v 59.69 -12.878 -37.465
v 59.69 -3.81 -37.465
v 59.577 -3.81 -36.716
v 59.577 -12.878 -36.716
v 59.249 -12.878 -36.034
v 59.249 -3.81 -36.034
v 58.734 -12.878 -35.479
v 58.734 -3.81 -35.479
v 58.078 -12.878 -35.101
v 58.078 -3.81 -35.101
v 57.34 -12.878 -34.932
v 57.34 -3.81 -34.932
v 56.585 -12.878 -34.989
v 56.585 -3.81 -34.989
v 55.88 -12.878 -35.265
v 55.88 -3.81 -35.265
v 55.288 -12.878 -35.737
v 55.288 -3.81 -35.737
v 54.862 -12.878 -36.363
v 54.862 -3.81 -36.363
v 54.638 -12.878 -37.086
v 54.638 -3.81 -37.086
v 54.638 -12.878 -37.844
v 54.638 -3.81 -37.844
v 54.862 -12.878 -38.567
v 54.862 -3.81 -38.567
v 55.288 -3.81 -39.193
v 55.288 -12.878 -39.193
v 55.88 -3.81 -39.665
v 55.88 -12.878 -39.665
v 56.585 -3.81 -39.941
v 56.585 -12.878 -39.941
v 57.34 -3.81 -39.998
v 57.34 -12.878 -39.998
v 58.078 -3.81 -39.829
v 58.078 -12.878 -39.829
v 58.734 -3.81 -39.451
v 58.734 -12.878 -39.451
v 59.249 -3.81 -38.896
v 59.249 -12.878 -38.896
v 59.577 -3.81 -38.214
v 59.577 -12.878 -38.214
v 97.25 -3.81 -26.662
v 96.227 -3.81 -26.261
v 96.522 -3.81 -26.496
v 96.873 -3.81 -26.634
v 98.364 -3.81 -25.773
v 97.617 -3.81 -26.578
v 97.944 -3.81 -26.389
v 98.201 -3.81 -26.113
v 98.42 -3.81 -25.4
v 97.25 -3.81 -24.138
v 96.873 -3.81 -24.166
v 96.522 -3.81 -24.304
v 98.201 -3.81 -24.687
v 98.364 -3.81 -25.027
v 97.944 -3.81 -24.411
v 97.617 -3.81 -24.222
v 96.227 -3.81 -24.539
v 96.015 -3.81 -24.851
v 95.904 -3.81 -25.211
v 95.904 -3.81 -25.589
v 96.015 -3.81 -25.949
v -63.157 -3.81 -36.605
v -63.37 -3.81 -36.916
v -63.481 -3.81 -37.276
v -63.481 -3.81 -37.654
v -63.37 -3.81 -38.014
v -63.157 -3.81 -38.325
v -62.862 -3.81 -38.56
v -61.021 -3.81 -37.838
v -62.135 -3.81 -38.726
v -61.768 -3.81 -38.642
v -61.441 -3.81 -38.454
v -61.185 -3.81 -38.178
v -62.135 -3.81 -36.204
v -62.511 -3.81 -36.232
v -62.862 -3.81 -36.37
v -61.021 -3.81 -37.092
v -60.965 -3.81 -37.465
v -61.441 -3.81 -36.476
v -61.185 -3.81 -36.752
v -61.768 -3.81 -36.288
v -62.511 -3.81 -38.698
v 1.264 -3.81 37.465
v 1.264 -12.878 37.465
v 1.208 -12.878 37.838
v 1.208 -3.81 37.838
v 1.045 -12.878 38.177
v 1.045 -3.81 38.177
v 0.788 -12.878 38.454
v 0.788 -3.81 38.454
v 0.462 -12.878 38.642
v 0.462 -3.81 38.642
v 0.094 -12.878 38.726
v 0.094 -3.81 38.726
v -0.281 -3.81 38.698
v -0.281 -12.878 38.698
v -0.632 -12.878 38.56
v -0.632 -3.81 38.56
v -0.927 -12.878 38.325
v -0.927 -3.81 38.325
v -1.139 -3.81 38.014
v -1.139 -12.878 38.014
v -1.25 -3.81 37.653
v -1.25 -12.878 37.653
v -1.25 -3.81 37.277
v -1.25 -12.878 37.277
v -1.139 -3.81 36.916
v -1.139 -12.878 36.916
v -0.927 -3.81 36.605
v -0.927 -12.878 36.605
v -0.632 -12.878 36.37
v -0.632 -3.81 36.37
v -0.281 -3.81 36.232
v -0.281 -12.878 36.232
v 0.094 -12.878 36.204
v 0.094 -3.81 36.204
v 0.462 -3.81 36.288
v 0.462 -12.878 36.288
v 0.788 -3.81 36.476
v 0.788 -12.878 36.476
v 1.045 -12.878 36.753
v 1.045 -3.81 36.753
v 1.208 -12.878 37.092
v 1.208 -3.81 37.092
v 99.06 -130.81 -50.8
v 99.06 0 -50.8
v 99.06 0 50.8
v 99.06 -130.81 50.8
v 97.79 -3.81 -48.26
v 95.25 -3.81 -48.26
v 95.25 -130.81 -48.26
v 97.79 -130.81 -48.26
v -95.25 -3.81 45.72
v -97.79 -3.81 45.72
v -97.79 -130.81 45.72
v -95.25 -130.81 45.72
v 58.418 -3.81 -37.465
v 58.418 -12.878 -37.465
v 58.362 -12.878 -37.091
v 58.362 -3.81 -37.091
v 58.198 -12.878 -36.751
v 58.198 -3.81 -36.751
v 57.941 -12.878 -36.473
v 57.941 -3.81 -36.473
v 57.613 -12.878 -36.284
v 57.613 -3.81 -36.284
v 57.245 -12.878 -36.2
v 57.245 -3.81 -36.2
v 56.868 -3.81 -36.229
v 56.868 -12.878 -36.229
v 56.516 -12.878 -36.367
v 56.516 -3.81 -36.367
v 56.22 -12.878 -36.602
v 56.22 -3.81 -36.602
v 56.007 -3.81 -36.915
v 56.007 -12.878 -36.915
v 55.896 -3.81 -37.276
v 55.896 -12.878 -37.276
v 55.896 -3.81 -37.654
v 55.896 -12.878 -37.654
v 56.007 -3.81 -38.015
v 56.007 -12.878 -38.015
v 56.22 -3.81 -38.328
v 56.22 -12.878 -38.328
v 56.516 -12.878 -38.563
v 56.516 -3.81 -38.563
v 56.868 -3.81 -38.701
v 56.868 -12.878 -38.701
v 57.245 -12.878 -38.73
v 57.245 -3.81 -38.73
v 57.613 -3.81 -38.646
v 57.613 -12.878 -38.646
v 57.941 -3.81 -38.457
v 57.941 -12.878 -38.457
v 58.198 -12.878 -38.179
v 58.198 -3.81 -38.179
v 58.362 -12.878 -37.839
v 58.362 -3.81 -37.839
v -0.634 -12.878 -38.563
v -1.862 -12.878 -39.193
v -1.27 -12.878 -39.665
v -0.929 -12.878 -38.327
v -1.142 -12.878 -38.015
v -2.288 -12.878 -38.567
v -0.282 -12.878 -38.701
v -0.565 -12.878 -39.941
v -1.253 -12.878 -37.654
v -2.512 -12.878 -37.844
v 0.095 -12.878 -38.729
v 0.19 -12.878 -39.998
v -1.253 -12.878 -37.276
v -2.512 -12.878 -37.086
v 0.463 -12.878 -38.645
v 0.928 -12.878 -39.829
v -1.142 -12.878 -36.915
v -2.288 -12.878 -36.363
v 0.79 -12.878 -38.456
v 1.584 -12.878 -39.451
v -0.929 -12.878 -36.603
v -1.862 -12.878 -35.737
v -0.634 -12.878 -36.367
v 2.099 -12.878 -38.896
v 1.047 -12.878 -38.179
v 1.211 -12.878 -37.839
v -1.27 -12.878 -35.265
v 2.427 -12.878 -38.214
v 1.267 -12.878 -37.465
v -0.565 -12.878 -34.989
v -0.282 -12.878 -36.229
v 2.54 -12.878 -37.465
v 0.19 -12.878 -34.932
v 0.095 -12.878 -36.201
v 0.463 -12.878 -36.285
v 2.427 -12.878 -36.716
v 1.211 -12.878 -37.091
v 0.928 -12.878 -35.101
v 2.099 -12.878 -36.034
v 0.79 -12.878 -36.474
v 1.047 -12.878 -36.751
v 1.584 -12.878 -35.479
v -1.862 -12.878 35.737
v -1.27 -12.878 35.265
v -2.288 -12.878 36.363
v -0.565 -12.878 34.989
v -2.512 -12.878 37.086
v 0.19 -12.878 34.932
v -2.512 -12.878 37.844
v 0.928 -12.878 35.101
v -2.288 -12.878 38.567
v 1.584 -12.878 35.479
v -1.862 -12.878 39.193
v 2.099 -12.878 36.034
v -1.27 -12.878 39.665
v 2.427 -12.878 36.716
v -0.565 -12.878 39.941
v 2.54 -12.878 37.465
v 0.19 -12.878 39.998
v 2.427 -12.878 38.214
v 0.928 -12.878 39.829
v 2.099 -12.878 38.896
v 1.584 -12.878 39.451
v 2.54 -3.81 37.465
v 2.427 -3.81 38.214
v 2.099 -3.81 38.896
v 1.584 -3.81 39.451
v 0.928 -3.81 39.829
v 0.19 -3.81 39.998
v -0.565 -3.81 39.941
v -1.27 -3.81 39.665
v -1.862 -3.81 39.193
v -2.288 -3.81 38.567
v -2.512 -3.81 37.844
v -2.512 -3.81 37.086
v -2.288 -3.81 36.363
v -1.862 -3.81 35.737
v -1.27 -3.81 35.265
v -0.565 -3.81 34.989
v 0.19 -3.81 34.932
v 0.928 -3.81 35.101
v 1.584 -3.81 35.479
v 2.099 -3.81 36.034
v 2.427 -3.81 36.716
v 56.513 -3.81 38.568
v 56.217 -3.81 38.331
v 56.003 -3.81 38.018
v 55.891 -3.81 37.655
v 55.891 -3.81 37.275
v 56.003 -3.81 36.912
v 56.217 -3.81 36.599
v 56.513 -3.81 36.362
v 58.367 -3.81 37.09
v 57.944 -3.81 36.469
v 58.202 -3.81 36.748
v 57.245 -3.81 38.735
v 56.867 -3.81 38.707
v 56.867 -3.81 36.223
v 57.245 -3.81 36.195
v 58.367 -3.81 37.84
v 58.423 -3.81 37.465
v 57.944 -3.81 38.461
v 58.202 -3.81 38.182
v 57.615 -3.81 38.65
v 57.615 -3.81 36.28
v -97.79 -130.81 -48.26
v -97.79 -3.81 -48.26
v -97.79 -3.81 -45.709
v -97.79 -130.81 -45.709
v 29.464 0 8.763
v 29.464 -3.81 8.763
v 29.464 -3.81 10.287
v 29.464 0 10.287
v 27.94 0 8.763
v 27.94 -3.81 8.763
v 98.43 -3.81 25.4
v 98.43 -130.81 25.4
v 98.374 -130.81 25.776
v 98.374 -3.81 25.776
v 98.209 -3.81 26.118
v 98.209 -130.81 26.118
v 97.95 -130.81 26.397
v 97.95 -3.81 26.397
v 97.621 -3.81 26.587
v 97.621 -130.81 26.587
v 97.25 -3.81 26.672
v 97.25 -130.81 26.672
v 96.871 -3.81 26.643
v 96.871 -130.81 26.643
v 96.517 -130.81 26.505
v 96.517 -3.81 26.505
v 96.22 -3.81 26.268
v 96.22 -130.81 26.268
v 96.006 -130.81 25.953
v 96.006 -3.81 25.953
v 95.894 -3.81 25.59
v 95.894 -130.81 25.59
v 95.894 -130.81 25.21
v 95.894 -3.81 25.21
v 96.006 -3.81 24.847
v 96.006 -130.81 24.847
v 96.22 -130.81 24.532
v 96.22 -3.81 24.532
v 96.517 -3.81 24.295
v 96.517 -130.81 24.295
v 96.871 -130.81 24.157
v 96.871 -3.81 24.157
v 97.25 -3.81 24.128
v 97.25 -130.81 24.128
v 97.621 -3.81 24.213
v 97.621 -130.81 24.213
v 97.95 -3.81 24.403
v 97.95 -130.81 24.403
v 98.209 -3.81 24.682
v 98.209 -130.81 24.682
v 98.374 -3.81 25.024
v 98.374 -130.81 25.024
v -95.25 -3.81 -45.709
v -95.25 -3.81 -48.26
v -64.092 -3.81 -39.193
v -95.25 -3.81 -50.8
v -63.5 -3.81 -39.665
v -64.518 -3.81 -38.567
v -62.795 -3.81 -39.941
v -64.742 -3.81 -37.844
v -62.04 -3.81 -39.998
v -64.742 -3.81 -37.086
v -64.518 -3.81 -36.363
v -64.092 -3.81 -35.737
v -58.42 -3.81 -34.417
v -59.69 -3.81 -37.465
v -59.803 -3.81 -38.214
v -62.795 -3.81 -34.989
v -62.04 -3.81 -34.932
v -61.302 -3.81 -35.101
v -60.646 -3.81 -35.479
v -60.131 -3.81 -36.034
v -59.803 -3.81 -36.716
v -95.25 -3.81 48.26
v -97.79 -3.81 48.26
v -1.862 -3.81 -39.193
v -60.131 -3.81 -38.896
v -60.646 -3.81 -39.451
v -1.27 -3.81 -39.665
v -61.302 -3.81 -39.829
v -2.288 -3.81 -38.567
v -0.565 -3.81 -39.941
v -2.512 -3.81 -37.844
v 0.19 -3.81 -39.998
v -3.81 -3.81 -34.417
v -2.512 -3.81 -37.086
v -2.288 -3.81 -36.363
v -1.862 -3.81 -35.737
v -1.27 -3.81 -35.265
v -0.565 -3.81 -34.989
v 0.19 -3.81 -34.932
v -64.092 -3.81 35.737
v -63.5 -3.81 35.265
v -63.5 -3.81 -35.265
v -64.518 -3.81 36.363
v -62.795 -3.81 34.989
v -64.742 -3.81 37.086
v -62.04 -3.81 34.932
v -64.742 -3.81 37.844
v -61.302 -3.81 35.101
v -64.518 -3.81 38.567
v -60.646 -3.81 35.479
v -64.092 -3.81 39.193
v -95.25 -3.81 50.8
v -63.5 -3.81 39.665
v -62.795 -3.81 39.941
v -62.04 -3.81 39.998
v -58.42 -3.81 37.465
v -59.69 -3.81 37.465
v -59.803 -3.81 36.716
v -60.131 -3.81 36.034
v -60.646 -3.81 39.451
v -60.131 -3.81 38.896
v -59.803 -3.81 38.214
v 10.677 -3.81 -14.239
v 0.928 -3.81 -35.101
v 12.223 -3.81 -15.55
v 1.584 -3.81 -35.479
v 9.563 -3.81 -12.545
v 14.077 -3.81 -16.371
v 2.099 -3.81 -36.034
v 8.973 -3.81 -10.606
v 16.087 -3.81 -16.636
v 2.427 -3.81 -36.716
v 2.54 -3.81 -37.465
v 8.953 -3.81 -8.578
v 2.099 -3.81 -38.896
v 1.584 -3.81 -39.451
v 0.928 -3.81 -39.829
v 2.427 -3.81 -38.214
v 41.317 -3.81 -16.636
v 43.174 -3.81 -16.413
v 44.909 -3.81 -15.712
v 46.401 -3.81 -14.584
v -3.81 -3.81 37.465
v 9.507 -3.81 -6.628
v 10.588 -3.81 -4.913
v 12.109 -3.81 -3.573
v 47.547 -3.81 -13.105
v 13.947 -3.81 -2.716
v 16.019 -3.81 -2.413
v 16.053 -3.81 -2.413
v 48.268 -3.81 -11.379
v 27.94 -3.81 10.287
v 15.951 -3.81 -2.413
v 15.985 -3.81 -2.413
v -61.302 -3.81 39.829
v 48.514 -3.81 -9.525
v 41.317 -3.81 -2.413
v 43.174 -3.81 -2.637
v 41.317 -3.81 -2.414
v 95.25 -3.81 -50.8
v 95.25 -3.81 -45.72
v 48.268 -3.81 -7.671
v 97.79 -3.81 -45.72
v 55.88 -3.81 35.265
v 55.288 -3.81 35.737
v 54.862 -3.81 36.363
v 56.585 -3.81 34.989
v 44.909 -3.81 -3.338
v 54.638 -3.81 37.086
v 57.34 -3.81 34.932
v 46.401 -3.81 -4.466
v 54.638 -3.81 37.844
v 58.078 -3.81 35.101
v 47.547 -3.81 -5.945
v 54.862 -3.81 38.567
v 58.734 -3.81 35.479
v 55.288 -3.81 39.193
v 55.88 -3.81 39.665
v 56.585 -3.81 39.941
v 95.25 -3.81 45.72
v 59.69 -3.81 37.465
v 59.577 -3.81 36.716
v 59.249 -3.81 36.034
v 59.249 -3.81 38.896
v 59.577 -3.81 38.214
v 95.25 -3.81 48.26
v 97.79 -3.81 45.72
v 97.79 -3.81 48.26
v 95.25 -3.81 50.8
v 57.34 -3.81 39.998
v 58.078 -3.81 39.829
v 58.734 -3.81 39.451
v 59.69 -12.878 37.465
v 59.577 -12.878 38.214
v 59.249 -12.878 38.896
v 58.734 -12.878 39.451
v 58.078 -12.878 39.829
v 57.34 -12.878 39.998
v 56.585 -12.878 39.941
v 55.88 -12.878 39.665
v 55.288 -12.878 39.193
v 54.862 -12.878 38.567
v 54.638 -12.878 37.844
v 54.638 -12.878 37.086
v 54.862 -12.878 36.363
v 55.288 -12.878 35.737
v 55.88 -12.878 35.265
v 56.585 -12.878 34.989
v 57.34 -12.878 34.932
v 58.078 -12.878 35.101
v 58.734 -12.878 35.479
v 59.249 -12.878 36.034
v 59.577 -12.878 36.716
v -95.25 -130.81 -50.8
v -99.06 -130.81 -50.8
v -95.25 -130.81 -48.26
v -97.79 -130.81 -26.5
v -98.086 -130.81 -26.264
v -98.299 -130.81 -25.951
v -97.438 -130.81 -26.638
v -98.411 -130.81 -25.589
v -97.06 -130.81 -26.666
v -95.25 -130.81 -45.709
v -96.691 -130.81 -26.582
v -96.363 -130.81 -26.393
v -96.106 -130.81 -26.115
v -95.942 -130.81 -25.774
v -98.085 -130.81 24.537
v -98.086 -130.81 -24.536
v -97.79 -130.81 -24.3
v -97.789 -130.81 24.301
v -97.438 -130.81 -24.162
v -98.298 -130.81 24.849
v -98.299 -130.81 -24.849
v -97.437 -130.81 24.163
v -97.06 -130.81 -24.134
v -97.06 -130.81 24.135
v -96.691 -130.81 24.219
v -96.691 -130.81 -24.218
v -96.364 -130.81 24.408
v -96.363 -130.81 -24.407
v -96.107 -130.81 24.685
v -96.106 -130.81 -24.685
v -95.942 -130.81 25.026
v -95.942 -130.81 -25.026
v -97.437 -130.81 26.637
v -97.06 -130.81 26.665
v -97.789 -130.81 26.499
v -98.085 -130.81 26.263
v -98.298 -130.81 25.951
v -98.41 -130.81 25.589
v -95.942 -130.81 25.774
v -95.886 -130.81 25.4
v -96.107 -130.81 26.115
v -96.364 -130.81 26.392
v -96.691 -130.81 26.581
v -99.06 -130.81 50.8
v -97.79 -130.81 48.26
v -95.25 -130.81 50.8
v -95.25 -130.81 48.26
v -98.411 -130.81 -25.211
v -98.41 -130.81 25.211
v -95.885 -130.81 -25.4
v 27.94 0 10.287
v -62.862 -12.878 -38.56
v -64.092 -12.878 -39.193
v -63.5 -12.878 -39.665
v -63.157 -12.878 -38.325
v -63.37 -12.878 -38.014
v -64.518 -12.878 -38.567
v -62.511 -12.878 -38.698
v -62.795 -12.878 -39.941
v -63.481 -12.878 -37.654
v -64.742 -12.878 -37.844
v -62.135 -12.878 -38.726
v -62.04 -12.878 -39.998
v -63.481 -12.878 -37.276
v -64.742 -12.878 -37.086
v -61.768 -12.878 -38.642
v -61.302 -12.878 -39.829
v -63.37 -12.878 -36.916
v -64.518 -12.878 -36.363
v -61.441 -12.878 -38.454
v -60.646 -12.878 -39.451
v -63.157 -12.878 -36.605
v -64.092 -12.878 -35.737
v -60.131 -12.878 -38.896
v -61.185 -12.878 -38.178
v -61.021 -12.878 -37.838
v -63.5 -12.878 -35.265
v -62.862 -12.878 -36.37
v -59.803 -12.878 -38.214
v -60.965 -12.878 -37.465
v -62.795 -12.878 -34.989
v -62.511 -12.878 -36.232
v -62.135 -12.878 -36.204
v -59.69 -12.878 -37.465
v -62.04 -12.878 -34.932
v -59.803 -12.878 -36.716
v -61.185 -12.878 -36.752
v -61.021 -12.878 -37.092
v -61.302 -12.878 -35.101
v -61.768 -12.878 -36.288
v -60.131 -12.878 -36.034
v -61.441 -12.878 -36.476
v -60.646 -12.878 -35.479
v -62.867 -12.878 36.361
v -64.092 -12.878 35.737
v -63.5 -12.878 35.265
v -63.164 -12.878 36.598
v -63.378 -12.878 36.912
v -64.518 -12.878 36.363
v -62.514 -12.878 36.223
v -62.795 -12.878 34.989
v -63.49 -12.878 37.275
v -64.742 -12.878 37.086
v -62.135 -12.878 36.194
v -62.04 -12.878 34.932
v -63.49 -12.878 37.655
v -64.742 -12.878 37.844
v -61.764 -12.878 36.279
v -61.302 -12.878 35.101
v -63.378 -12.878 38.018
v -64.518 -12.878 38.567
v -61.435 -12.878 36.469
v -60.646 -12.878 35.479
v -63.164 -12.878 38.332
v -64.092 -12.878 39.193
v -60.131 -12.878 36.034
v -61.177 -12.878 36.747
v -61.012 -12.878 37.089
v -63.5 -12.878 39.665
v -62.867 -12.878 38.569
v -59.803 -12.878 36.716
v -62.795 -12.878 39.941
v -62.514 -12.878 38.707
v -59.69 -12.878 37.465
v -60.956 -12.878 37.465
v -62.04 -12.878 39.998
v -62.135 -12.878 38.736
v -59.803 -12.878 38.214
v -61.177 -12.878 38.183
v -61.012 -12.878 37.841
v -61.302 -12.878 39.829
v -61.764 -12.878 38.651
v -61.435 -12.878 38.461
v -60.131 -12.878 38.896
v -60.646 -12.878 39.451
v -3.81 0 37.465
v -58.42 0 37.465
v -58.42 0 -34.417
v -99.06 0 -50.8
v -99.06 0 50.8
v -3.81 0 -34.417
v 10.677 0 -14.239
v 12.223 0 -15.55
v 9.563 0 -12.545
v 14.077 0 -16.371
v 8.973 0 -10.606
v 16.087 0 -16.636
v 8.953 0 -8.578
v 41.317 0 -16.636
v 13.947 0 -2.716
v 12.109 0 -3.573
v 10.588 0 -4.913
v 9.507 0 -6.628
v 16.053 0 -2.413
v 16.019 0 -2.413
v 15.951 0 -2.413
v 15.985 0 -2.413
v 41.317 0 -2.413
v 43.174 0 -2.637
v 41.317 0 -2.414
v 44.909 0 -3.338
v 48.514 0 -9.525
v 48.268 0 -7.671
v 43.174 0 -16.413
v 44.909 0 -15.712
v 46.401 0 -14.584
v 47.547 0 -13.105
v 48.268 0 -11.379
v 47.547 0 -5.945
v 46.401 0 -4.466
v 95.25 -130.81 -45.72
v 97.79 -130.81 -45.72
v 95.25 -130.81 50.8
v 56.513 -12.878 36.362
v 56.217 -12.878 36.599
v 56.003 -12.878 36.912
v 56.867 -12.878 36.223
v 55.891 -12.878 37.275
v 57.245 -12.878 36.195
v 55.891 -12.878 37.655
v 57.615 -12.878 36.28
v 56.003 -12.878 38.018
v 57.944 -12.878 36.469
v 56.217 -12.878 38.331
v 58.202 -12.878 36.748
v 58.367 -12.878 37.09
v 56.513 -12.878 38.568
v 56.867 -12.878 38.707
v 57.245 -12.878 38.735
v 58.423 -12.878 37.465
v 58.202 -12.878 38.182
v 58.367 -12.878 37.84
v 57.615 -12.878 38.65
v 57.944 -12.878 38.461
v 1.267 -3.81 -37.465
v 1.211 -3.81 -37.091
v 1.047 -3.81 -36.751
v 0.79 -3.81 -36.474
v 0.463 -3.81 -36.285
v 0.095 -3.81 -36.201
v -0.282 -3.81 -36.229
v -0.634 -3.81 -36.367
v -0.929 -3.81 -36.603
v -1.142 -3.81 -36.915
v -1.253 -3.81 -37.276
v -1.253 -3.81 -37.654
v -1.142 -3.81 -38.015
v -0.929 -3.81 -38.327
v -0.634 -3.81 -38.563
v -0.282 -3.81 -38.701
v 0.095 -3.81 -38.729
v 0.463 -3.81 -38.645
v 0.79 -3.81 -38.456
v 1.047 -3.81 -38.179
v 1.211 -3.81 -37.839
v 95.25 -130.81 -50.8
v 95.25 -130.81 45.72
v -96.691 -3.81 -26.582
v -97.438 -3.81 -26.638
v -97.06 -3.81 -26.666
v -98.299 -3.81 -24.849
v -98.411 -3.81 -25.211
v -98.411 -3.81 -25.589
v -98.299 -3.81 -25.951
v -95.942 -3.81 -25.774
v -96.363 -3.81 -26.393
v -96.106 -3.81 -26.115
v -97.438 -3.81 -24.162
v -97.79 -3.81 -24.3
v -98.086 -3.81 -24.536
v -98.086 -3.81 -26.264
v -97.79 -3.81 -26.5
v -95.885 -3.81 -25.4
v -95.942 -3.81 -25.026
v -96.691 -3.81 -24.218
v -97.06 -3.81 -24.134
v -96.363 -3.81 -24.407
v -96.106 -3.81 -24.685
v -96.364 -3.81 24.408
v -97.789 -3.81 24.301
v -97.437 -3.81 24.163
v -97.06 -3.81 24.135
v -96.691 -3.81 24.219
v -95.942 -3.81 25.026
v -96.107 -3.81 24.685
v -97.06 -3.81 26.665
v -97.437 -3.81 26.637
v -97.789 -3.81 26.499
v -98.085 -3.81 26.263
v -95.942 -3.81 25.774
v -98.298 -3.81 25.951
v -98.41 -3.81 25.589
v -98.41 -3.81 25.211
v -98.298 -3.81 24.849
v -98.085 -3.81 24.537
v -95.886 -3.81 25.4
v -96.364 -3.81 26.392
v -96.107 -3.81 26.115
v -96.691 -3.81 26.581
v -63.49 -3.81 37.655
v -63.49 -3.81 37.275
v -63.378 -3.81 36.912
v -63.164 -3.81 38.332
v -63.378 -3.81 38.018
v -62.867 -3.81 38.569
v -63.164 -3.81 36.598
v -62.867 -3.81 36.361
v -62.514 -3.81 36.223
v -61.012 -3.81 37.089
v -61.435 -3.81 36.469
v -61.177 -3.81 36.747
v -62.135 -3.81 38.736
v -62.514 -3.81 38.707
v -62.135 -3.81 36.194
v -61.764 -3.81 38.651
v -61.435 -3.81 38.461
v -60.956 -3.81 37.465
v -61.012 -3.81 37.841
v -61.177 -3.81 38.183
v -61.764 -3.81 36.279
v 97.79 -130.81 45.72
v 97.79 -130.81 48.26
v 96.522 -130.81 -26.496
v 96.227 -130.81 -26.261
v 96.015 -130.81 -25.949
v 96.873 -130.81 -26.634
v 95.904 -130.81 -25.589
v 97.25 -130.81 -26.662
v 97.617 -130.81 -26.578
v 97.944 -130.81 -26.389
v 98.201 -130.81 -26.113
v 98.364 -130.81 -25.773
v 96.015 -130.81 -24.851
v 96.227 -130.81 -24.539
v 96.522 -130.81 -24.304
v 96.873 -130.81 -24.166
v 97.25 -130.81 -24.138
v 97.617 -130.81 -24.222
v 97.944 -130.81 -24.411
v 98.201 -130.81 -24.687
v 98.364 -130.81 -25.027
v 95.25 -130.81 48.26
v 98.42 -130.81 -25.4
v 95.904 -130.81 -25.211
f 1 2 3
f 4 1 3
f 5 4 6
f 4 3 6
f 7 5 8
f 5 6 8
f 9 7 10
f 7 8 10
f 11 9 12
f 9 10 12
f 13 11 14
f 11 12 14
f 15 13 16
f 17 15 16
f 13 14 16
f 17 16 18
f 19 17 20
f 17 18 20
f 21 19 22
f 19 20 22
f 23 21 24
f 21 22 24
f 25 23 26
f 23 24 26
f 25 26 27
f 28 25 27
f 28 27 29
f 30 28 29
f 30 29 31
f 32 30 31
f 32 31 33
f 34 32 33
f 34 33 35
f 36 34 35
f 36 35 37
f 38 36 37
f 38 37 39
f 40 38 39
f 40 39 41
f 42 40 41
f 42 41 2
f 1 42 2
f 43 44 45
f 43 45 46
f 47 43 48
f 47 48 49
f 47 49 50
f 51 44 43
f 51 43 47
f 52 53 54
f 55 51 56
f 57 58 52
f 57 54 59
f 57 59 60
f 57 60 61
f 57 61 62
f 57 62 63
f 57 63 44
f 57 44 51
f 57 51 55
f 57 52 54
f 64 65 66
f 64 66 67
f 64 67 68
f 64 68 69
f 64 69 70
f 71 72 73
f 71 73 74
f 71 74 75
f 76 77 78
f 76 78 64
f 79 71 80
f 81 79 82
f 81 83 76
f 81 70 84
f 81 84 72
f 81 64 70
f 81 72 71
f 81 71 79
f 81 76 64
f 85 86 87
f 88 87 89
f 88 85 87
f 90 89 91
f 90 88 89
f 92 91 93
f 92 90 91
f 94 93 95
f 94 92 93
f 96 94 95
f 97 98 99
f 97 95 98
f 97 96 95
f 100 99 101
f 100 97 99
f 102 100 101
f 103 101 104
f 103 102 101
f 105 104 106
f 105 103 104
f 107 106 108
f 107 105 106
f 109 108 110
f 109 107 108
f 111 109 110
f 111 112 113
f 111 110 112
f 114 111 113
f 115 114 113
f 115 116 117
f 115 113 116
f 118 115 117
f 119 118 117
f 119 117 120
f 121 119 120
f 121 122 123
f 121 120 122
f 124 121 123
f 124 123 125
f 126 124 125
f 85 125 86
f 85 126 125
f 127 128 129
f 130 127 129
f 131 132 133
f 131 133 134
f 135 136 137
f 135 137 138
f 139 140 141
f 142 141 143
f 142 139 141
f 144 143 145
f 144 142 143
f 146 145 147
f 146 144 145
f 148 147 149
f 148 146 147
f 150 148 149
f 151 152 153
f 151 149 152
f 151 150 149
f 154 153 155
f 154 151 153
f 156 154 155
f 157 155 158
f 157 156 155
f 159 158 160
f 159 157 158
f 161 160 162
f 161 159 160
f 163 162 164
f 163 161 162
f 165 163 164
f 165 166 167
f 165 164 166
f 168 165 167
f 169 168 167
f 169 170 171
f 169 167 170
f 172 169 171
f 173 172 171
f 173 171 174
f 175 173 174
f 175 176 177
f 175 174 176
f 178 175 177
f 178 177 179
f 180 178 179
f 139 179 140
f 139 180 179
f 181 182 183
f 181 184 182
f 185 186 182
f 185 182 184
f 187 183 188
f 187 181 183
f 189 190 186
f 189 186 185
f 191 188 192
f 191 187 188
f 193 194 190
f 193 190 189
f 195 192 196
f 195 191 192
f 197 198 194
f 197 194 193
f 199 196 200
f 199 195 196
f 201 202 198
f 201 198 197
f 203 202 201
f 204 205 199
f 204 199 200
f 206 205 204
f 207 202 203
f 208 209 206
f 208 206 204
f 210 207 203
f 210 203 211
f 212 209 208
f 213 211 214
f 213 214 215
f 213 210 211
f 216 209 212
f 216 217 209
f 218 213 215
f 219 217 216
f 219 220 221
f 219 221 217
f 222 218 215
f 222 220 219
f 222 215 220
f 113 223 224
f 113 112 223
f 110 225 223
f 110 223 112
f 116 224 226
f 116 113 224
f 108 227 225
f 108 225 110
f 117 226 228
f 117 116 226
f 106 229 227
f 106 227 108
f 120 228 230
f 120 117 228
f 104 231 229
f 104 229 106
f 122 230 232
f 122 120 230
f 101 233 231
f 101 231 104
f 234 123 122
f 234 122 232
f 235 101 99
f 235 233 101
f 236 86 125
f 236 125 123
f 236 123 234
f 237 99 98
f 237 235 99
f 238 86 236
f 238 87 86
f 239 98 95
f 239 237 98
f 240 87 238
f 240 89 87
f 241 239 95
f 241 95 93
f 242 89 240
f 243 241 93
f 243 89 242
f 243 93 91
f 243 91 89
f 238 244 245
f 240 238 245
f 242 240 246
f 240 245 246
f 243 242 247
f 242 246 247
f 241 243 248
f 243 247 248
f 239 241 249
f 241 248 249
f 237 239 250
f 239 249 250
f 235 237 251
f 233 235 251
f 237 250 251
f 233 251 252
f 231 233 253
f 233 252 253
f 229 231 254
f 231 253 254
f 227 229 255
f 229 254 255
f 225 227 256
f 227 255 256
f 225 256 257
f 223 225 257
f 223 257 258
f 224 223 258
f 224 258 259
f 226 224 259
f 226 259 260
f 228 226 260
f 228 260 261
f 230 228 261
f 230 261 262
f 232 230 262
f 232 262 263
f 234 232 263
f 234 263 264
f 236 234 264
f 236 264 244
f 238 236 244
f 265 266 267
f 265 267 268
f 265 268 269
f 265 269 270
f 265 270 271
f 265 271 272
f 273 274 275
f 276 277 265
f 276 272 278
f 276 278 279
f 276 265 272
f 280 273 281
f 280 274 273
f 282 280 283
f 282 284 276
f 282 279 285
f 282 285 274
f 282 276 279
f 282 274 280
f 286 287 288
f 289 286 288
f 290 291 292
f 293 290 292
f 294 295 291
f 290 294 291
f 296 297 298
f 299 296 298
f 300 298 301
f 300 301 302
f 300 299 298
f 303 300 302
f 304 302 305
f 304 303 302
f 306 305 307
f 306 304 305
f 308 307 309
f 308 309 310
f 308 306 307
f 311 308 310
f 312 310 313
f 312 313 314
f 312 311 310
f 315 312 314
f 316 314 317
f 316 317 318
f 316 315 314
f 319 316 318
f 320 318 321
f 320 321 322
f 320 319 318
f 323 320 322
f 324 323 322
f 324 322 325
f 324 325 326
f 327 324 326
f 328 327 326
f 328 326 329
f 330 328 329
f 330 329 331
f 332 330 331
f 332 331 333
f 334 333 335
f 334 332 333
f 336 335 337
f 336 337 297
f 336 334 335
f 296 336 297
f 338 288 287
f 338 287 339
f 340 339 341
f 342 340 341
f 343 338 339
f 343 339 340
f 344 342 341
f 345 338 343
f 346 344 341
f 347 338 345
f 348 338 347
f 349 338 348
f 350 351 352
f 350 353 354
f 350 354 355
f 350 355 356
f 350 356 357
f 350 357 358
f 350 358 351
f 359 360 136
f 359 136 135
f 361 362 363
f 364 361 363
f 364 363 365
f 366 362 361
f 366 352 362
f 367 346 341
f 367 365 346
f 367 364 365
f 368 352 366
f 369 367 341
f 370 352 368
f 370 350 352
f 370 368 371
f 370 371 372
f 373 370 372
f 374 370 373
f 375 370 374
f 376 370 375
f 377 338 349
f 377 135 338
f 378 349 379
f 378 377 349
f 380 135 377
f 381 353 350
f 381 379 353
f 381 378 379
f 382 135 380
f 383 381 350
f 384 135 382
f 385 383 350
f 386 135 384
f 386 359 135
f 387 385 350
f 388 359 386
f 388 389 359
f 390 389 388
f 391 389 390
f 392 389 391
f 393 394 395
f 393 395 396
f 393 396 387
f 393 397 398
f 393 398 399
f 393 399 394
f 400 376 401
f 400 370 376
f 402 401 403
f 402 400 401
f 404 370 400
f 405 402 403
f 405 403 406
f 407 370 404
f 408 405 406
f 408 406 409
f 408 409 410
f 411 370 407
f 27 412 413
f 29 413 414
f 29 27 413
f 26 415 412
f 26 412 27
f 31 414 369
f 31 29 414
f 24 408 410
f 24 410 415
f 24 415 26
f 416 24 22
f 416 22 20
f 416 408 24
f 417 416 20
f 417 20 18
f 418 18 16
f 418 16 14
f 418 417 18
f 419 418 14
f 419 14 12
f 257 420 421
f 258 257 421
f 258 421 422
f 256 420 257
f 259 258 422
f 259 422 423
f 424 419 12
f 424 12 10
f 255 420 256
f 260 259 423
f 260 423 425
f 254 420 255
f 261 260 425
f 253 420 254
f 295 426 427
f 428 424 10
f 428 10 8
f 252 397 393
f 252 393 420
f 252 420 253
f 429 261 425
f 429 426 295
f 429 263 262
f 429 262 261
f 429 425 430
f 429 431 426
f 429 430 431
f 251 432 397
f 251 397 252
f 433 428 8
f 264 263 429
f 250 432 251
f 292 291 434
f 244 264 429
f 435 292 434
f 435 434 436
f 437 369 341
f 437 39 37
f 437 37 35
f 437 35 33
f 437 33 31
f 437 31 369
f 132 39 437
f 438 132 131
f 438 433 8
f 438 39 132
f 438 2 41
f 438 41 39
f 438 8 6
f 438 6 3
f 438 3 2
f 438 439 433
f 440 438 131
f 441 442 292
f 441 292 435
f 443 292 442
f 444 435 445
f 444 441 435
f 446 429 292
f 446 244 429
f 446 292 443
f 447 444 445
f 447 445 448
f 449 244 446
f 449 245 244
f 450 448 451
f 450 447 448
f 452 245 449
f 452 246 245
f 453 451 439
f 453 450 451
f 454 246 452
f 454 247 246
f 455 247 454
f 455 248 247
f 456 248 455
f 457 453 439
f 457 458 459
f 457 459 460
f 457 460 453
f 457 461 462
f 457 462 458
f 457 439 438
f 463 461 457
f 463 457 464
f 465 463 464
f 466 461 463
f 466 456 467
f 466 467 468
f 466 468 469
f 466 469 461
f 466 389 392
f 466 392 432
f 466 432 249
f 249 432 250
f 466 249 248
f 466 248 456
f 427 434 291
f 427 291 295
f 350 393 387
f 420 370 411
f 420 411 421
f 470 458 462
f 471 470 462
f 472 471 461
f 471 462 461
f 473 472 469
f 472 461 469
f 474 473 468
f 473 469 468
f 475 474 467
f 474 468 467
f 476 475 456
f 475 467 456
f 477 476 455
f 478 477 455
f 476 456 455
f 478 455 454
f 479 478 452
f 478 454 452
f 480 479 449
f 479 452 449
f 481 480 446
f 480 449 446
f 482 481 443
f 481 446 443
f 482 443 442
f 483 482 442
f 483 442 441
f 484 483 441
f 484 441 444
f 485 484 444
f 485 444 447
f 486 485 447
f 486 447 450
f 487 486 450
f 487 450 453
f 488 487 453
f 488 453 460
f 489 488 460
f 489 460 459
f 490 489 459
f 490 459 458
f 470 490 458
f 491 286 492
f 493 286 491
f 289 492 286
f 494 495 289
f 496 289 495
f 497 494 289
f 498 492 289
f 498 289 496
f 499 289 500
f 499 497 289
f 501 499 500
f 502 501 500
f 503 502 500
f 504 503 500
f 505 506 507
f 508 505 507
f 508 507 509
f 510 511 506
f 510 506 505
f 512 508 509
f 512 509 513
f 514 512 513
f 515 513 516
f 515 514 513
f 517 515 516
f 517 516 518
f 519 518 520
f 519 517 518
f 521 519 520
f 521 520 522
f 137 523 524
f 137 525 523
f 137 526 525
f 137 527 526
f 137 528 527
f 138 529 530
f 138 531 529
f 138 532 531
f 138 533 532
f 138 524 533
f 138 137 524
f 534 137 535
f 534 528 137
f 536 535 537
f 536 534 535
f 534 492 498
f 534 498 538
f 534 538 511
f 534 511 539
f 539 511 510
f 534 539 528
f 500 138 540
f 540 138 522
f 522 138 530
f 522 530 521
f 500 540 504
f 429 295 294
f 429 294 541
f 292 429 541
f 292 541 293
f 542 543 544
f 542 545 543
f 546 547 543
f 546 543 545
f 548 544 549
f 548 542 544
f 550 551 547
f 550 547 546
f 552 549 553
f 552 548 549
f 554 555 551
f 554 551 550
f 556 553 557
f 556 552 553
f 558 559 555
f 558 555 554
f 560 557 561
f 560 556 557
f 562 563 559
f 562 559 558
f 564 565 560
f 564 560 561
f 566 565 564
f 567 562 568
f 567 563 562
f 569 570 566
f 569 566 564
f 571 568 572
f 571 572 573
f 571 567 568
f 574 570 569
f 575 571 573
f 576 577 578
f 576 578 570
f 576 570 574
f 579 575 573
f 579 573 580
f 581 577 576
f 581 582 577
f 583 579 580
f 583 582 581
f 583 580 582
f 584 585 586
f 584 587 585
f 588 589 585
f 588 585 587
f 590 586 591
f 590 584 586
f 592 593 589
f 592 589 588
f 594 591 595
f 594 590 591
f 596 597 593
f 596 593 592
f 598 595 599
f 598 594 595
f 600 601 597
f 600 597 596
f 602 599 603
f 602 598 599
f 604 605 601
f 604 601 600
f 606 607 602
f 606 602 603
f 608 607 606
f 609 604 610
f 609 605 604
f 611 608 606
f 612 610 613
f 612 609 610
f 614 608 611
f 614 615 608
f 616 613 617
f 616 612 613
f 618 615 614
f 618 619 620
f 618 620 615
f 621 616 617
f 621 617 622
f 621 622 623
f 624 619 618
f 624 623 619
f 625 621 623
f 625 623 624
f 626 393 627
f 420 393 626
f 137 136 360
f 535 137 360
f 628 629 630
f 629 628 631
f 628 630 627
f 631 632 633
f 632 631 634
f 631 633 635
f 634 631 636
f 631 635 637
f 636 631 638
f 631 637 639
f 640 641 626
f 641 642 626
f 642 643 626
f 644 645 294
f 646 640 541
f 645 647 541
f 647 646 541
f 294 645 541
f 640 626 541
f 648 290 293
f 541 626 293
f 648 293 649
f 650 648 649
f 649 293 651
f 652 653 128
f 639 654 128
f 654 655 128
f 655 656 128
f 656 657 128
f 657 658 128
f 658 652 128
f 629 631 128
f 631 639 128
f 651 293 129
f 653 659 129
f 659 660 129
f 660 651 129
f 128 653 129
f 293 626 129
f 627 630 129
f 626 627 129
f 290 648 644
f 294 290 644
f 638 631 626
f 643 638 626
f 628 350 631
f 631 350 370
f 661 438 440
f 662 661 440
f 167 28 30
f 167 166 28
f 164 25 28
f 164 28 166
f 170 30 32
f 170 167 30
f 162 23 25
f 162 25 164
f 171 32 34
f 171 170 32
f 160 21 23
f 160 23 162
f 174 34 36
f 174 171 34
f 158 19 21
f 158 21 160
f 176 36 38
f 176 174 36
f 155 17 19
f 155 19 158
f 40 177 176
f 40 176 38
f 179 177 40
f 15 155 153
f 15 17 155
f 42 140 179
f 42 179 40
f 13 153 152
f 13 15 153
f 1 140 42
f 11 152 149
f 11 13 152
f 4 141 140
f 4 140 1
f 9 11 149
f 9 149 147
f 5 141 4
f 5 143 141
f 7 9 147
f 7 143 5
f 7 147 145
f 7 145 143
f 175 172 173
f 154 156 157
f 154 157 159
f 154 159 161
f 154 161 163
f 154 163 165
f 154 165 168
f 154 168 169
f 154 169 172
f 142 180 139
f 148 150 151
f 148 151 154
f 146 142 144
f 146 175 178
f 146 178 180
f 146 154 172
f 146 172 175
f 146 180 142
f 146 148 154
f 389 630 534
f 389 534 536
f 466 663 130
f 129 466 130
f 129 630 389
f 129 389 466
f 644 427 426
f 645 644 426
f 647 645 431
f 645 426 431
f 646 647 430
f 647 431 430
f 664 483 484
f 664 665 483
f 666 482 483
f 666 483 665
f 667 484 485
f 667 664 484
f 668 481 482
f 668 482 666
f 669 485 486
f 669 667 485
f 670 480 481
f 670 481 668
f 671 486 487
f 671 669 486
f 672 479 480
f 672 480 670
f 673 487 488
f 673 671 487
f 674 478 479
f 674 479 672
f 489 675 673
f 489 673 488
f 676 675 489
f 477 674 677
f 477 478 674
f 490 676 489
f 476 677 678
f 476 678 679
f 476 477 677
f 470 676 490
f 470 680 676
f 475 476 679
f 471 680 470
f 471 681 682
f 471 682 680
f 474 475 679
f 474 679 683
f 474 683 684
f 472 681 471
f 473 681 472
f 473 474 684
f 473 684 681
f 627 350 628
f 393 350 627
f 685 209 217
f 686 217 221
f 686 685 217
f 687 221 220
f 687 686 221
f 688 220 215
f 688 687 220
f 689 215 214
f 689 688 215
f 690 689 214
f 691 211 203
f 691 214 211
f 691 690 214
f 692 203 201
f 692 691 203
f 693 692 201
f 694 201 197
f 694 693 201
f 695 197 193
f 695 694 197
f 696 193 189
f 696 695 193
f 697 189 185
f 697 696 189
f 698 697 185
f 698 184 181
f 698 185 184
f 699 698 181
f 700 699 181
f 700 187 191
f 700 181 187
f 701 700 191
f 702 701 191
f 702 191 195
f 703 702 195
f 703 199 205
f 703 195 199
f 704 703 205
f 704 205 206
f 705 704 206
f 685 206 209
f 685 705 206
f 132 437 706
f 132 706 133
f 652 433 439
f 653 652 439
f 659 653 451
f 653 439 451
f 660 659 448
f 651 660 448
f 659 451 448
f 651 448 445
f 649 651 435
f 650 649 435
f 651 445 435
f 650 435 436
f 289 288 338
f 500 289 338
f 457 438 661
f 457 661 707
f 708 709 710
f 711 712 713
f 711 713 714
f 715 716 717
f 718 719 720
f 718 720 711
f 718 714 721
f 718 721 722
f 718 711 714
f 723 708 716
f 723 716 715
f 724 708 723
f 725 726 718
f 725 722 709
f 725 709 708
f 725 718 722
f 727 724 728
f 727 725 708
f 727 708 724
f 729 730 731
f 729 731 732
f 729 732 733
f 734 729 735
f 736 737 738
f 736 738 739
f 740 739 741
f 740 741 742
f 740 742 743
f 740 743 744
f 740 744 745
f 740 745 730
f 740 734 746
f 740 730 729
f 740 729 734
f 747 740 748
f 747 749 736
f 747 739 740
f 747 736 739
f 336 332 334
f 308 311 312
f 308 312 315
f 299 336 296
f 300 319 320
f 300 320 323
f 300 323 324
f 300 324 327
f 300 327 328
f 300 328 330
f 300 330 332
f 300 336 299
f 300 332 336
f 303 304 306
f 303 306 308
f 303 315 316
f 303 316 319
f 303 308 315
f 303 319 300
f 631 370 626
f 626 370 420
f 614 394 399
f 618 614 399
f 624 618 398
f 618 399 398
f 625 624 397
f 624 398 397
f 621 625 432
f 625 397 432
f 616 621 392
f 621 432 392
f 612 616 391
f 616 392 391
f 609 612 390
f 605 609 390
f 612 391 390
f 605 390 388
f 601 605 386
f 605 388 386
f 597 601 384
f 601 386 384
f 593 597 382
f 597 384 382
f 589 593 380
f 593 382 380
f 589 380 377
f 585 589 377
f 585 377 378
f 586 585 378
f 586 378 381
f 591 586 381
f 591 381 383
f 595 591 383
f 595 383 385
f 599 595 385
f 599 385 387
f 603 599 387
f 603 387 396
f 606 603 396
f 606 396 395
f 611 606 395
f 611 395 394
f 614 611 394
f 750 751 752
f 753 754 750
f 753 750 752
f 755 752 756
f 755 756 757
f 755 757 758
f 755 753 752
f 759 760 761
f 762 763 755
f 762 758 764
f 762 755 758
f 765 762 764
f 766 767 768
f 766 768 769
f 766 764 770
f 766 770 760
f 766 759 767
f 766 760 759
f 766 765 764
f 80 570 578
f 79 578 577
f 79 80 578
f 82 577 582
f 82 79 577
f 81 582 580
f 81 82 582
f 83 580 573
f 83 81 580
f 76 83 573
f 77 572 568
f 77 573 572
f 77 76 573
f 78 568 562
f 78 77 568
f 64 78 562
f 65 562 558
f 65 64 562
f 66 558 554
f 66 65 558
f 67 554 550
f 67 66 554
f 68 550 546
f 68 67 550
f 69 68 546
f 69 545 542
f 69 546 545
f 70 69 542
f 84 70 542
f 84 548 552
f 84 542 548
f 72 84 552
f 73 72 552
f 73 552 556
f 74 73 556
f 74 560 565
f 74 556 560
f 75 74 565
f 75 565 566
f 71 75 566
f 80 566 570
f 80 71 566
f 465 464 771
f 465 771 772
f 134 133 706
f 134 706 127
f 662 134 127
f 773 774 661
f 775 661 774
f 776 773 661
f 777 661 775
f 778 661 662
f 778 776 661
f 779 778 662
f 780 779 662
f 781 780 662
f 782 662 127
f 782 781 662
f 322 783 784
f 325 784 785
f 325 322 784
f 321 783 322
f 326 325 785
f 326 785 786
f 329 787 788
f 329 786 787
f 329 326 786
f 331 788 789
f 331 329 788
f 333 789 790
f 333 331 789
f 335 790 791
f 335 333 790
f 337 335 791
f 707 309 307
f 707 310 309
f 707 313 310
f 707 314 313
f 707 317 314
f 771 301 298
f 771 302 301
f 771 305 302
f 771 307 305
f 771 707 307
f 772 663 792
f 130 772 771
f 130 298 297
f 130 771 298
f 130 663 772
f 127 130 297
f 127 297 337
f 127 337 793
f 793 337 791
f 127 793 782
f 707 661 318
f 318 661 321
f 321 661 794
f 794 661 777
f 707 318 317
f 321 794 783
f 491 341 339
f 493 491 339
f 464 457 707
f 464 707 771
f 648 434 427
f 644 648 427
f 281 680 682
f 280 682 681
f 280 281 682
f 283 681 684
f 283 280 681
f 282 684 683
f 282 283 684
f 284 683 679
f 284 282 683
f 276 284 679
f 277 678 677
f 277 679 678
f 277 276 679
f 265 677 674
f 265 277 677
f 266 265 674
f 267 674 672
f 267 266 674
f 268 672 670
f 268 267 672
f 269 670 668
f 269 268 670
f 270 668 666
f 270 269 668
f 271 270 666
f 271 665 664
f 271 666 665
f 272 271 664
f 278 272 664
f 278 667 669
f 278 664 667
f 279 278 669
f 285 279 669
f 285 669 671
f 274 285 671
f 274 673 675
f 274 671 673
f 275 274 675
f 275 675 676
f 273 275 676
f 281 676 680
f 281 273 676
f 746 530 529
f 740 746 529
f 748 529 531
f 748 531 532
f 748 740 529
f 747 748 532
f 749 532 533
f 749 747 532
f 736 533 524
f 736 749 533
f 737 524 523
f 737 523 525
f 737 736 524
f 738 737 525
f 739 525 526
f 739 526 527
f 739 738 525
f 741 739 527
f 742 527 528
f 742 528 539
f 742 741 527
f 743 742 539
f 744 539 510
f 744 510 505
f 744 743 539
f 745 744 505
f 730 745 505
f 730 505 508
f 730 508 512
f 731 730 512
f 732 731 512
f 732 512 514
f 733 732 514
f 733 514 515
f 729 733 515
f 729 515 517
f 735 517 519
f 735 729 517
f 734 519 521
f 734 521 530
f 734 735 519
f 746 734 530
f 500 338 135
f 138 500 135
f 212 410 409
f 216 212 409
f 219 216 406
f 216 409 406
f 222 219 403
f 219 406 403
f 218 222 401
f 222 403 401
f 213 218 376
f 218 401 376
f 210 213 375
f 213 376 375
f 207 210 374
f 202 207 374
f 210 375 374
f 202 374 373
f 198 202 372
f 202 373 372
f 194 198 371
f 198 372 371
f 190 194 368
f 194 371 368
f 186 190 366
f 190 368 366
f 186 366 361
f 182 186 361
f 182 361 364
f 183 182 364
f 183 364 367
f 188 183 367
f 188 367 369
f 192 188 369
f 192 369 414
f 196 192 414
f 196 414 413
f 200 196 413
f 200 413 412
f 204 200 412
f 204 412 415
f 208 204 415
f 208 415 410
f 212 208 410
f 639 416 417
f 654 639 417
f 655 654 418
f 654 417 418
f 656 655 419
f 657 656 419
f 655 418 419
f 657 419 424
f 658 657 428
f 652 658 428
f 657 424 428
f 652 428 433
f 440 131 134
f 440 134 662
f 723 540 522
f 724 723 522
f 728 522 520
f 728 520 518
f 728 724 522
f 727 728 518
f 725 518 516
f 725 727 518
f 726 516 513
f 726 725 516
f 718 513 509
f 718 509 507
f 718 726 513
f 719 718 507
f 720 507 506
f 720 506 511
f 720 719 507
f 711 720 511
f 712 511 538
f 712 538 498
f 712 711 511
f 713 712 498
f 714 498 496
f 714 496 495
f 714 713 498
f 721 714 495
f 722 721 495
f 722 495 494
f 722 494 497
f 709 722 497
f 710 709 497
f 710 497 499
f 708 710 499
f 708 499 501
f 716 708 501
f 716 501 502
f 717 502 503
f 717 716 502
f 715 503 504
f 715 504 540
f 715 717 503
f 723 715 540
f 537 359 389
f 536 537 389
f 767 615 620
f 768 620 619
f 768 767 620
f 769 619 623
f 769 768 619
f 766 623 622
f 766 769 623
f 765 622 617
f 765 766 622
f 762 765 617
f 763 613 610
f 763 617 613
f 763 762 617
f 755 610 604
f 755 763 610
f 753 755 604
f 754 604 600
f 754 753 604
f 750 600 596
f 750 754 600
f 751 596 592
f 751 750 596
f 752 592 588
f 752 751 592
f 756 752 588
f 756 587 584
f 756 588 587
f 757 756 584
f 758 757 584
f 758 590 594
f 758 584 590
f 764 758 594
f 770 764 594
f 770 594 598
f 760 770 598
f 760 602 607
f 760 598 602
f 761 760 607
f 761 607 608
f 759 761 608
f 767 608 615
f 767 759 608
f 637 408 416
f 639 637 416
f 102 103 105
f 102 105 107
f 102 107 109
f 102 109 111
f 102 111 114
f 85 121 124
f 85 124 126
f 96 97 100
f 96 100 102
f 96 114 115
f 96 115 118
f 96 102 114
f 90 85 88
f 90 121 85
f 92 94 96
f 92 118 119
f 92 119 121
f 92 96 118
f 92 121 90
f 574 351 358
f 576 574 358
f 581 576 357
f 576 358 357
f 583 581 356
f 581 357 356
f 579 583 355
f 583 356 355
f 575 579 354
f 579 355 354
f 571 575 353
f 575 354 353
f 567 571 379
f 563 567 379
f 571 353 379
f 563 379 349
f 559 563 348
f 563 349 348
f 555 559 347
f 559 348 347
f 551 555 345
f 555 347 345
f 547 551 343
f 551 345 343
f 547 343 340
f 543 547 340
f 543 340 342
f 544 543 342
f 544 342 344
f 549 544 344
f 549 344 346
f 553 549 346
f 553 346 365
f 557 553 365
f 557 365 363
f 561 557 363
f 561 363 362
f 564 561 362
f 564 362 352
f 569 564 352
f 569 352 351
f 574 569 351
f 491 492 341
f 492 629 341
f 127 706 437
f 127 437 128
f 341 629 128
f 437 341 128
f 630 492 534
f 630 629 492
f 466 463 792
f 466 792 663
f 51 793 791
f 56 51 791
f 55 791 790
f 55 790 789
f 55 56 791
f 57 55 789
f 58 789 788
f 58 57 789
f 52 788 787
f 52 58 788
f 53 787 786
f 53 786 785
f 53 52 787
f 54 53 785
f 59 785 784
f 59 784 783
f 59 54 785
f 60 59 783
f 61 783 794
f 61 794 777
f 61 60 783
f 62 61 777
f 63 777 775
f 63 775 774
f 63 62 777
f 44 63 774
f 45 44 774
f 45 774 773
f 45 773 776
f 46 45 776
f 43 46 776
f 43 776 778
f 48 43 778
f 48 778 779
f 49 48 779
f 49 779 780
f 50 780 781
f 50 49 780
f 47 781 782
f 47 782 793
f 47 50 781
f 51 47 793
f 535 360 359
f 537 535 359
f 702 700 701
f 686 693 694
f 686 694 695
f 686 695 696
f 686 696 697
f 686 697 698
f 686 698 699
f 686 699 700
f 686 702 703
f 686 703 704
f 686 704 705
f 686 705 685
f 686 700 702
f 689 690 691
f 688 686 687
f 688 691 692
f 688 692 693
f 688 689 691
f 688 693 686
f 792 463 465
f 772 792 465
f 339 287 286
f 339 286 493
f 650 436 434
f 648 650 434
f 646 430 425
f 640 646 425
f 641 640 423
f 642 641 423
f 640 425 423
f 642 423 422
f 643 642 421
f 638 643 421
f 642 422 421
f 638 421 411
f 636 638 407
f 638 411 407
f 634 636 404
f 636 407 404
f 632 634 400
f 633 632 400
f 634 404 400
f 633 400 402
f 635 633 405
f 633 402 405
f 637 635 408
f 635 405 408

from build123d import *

# Parameters (mm, degrees)
F0_W      = 198.12
F0_H      = 101.6
F2_DEPTH  = 3.81
F1_R      = 2.54
F3_DEPTH  = 12.8778
F4_R      = 1.2742822285
F4_R_2    = 1.2649039603
F4_R_3    = 1.2682976719
F4_R_4    = 1.273443292
F4_R_5    = 1.26744028
F4_R_6    = 1.2643596857
F5_DEPTH  = 10.3378
F6_W      = 54.61
F6_H      = 71.882
F6_W_2    = 1.524
F6_H_2    = 1.524
F7_DEPTH  = 3.81
F8_W      = 3.81
F8_H      = 101.6
F9_DEPTH  = 127
F10_W     = 2.54
F10_H     = 2.54
F10_H_2   = 2.5507584214
F10_R     = 1.2654265937
F10_R_2   = 1.2754683581
F10_R_3   = 1.268876748
F10_R_4   = 1.2699045753
F11_DEPTH = 127


with BuildPart() as f2:
    # F0 (on Front) → F2 (new body)
    with BuildSketch(Plane.XZ):
        Rectangle(F0_W, F0_H)
    extrude(amount=F2_DEPTH)

    # F1 (on Front) → F3 (join)
    with BuildSketch(Plane.XZ):
        with Locations((-62.23, -37.465)):
            Circle(F1_R)
        with Locations((-62.23, 37.465)):
            Circle(F1_R)
        with Locations((0, 37.465)):
            Circle(F1_R)
        with Locations((0, -37.465)):
            Circle(F1_R)
        with Locations((57.15, -37.465)):
            Circle(F1_R)
        with Locations((57.15, 37.465)):
            Circle(F1_R)
    extrude(amount=F3_DEPTH)

    # F4 (on face) → F5 (cut)
    with BuildSketch(Plane.XZ.offset(3.81)):
        with Locations((-62.23, 37.465)):
            Circle(F4_R)
        with Locations((-62.23, -37.465)):
            Circle(F4_R_2)
        with Locations((57.15, -37.465)):
            Circle(F4_R_3)
        with Locations((57.15, 37.465)):
            Circle(F4_R_4)
        with Locations((0, -37.465)):
            Circle(F4_R_5)
        with Locations((0, 37.465)):
            Circle(F4_R_6)
    extrude(amount=F5_DEPTH, mode=Mode.SUBTRACT)

    # F6 (on face) → F7 (cut)
    with BuildSketch(Plane.XZ.offset(3.81)):
        with Locations((-31.115, 1.524)):
            Rectangle(F6_W, F6_H)
        with BuildLine():
            ThreePointArc((15.9514440232, -2.413179692), (8.8903213435, -9.5926068587), (16.086657352, -16.6364961248))
            Line((16.086657352, -16.6364961248), (41.317342648, -16.6364961248))
            ThreePointArc((41.317342648, -16.6364961248), (34.29, -9.525), (41.317342648, -2.4135038752))
            Line((41.317342648, -2.4135038752), (41.317342648, -2.413179692))
            Line((41.317342648, -2.413179692), (15.9514440232, -2.413179692))
        make_face()
        with BuildLine():
            ThreePointArc((15.9514440232, -2.413179692), (21.0130373124, -4.4782139877), (23.114, -9.525))
            ThreePointArc((23.114, -9.525), (21.0607857776, -14.5239229296), (16.086657352, -16.6364961248))
            Line((16.086657352, -16.6364961248), (15.9514440232, -16.6364961248))
            Line((15.9514440232, -16.6364961248), (15.9514440232, -2.413179692))
        make_face(mode=Mode.SUBTRACT)
        with BuildLine():
            Line((41.317342648, -2.4135038752), (41.317342648, -16.6364961248))
            ThreePointArc((41.317342648, -16.6364961248), (46.4009229296, -14.5837857776), (48.514, -9.525))
            ThreePointArc((48.514, -9.525), (46.4009229296, -4.4662142224), (41.317342648, -2.4135038752))
        make_face()
        with BuildLine():
            ThreePointArc((16.086657352, -16.6364961248), (21.0607857776, -14.5239229296), (23.114, -9.525))
            ThreePointArc((23.114, -9.525), (21.0130373124, -4.4782139877), (15.9514440232, -2.413179692))
            Line((15.9514440232, -2.413179692), (15.9514440232, -16.6364961248))
            Line((15.9514440232, -16.6364961248), (16.086657352, -16.6364961248))
        make_face()
        with BuildLine():
            ThreePointArc((41.317342648, -2.4135038752), (34.29, -9.525), (41.317342648, -16.6364961248))
            Line((41.317342648, -16.6364961248), (41.317342648, -2.4135038752))
        make_face()
        with Locations((28.702, 9.525)):
            Rectangle(F6_W_2, F6_H_2)
    extrude(amount=-F7_DEPTH, mode=Mode.SUBTRACT)

    # F8 (on face) → F9 (join)
    with BuildSketch(Plane.XZ.offset(3.81)):
        with Locations((-97.155, 0)):
            Rectangle(F8_W, F8_H)
        with Locations((97.155, 0)):
            Rectangle(F8_W, F8_H)
    extrude(amount=F9_DEPTH)

    # F10 (on face) → F11 (cut)
    with BuildSketch(Plane.XZ.offset(3.81)):
        with Locations((-96.52, 46.99)):
            Rectangle(F10_W, F10_H)
        with Locations((-96.52, -46.9846207893)):
            Rectangle(F10_W, F10_H_2)
        with Locations((96.52, 46.99)):
            Rectangle(F10_W, F10_H)
        with Locations((96.52, -46.99)):
            Rectangle(F10_W, F10_H)
        with Locations((97.155, -25.4)):
            Circle(F10_R)
        with Locations((97.155, 25.4)):
            Circle(F10_R_2)
        with Locations((-97.155, 25.4)):
            Circle(F10_R_3)
        with Locations((-97.155, -25.4)):
            Circle(F10_R_4)
    extrude(amount=F11_DEPTH, mode=Mode.SUBTRACT)


solid = f2.part
